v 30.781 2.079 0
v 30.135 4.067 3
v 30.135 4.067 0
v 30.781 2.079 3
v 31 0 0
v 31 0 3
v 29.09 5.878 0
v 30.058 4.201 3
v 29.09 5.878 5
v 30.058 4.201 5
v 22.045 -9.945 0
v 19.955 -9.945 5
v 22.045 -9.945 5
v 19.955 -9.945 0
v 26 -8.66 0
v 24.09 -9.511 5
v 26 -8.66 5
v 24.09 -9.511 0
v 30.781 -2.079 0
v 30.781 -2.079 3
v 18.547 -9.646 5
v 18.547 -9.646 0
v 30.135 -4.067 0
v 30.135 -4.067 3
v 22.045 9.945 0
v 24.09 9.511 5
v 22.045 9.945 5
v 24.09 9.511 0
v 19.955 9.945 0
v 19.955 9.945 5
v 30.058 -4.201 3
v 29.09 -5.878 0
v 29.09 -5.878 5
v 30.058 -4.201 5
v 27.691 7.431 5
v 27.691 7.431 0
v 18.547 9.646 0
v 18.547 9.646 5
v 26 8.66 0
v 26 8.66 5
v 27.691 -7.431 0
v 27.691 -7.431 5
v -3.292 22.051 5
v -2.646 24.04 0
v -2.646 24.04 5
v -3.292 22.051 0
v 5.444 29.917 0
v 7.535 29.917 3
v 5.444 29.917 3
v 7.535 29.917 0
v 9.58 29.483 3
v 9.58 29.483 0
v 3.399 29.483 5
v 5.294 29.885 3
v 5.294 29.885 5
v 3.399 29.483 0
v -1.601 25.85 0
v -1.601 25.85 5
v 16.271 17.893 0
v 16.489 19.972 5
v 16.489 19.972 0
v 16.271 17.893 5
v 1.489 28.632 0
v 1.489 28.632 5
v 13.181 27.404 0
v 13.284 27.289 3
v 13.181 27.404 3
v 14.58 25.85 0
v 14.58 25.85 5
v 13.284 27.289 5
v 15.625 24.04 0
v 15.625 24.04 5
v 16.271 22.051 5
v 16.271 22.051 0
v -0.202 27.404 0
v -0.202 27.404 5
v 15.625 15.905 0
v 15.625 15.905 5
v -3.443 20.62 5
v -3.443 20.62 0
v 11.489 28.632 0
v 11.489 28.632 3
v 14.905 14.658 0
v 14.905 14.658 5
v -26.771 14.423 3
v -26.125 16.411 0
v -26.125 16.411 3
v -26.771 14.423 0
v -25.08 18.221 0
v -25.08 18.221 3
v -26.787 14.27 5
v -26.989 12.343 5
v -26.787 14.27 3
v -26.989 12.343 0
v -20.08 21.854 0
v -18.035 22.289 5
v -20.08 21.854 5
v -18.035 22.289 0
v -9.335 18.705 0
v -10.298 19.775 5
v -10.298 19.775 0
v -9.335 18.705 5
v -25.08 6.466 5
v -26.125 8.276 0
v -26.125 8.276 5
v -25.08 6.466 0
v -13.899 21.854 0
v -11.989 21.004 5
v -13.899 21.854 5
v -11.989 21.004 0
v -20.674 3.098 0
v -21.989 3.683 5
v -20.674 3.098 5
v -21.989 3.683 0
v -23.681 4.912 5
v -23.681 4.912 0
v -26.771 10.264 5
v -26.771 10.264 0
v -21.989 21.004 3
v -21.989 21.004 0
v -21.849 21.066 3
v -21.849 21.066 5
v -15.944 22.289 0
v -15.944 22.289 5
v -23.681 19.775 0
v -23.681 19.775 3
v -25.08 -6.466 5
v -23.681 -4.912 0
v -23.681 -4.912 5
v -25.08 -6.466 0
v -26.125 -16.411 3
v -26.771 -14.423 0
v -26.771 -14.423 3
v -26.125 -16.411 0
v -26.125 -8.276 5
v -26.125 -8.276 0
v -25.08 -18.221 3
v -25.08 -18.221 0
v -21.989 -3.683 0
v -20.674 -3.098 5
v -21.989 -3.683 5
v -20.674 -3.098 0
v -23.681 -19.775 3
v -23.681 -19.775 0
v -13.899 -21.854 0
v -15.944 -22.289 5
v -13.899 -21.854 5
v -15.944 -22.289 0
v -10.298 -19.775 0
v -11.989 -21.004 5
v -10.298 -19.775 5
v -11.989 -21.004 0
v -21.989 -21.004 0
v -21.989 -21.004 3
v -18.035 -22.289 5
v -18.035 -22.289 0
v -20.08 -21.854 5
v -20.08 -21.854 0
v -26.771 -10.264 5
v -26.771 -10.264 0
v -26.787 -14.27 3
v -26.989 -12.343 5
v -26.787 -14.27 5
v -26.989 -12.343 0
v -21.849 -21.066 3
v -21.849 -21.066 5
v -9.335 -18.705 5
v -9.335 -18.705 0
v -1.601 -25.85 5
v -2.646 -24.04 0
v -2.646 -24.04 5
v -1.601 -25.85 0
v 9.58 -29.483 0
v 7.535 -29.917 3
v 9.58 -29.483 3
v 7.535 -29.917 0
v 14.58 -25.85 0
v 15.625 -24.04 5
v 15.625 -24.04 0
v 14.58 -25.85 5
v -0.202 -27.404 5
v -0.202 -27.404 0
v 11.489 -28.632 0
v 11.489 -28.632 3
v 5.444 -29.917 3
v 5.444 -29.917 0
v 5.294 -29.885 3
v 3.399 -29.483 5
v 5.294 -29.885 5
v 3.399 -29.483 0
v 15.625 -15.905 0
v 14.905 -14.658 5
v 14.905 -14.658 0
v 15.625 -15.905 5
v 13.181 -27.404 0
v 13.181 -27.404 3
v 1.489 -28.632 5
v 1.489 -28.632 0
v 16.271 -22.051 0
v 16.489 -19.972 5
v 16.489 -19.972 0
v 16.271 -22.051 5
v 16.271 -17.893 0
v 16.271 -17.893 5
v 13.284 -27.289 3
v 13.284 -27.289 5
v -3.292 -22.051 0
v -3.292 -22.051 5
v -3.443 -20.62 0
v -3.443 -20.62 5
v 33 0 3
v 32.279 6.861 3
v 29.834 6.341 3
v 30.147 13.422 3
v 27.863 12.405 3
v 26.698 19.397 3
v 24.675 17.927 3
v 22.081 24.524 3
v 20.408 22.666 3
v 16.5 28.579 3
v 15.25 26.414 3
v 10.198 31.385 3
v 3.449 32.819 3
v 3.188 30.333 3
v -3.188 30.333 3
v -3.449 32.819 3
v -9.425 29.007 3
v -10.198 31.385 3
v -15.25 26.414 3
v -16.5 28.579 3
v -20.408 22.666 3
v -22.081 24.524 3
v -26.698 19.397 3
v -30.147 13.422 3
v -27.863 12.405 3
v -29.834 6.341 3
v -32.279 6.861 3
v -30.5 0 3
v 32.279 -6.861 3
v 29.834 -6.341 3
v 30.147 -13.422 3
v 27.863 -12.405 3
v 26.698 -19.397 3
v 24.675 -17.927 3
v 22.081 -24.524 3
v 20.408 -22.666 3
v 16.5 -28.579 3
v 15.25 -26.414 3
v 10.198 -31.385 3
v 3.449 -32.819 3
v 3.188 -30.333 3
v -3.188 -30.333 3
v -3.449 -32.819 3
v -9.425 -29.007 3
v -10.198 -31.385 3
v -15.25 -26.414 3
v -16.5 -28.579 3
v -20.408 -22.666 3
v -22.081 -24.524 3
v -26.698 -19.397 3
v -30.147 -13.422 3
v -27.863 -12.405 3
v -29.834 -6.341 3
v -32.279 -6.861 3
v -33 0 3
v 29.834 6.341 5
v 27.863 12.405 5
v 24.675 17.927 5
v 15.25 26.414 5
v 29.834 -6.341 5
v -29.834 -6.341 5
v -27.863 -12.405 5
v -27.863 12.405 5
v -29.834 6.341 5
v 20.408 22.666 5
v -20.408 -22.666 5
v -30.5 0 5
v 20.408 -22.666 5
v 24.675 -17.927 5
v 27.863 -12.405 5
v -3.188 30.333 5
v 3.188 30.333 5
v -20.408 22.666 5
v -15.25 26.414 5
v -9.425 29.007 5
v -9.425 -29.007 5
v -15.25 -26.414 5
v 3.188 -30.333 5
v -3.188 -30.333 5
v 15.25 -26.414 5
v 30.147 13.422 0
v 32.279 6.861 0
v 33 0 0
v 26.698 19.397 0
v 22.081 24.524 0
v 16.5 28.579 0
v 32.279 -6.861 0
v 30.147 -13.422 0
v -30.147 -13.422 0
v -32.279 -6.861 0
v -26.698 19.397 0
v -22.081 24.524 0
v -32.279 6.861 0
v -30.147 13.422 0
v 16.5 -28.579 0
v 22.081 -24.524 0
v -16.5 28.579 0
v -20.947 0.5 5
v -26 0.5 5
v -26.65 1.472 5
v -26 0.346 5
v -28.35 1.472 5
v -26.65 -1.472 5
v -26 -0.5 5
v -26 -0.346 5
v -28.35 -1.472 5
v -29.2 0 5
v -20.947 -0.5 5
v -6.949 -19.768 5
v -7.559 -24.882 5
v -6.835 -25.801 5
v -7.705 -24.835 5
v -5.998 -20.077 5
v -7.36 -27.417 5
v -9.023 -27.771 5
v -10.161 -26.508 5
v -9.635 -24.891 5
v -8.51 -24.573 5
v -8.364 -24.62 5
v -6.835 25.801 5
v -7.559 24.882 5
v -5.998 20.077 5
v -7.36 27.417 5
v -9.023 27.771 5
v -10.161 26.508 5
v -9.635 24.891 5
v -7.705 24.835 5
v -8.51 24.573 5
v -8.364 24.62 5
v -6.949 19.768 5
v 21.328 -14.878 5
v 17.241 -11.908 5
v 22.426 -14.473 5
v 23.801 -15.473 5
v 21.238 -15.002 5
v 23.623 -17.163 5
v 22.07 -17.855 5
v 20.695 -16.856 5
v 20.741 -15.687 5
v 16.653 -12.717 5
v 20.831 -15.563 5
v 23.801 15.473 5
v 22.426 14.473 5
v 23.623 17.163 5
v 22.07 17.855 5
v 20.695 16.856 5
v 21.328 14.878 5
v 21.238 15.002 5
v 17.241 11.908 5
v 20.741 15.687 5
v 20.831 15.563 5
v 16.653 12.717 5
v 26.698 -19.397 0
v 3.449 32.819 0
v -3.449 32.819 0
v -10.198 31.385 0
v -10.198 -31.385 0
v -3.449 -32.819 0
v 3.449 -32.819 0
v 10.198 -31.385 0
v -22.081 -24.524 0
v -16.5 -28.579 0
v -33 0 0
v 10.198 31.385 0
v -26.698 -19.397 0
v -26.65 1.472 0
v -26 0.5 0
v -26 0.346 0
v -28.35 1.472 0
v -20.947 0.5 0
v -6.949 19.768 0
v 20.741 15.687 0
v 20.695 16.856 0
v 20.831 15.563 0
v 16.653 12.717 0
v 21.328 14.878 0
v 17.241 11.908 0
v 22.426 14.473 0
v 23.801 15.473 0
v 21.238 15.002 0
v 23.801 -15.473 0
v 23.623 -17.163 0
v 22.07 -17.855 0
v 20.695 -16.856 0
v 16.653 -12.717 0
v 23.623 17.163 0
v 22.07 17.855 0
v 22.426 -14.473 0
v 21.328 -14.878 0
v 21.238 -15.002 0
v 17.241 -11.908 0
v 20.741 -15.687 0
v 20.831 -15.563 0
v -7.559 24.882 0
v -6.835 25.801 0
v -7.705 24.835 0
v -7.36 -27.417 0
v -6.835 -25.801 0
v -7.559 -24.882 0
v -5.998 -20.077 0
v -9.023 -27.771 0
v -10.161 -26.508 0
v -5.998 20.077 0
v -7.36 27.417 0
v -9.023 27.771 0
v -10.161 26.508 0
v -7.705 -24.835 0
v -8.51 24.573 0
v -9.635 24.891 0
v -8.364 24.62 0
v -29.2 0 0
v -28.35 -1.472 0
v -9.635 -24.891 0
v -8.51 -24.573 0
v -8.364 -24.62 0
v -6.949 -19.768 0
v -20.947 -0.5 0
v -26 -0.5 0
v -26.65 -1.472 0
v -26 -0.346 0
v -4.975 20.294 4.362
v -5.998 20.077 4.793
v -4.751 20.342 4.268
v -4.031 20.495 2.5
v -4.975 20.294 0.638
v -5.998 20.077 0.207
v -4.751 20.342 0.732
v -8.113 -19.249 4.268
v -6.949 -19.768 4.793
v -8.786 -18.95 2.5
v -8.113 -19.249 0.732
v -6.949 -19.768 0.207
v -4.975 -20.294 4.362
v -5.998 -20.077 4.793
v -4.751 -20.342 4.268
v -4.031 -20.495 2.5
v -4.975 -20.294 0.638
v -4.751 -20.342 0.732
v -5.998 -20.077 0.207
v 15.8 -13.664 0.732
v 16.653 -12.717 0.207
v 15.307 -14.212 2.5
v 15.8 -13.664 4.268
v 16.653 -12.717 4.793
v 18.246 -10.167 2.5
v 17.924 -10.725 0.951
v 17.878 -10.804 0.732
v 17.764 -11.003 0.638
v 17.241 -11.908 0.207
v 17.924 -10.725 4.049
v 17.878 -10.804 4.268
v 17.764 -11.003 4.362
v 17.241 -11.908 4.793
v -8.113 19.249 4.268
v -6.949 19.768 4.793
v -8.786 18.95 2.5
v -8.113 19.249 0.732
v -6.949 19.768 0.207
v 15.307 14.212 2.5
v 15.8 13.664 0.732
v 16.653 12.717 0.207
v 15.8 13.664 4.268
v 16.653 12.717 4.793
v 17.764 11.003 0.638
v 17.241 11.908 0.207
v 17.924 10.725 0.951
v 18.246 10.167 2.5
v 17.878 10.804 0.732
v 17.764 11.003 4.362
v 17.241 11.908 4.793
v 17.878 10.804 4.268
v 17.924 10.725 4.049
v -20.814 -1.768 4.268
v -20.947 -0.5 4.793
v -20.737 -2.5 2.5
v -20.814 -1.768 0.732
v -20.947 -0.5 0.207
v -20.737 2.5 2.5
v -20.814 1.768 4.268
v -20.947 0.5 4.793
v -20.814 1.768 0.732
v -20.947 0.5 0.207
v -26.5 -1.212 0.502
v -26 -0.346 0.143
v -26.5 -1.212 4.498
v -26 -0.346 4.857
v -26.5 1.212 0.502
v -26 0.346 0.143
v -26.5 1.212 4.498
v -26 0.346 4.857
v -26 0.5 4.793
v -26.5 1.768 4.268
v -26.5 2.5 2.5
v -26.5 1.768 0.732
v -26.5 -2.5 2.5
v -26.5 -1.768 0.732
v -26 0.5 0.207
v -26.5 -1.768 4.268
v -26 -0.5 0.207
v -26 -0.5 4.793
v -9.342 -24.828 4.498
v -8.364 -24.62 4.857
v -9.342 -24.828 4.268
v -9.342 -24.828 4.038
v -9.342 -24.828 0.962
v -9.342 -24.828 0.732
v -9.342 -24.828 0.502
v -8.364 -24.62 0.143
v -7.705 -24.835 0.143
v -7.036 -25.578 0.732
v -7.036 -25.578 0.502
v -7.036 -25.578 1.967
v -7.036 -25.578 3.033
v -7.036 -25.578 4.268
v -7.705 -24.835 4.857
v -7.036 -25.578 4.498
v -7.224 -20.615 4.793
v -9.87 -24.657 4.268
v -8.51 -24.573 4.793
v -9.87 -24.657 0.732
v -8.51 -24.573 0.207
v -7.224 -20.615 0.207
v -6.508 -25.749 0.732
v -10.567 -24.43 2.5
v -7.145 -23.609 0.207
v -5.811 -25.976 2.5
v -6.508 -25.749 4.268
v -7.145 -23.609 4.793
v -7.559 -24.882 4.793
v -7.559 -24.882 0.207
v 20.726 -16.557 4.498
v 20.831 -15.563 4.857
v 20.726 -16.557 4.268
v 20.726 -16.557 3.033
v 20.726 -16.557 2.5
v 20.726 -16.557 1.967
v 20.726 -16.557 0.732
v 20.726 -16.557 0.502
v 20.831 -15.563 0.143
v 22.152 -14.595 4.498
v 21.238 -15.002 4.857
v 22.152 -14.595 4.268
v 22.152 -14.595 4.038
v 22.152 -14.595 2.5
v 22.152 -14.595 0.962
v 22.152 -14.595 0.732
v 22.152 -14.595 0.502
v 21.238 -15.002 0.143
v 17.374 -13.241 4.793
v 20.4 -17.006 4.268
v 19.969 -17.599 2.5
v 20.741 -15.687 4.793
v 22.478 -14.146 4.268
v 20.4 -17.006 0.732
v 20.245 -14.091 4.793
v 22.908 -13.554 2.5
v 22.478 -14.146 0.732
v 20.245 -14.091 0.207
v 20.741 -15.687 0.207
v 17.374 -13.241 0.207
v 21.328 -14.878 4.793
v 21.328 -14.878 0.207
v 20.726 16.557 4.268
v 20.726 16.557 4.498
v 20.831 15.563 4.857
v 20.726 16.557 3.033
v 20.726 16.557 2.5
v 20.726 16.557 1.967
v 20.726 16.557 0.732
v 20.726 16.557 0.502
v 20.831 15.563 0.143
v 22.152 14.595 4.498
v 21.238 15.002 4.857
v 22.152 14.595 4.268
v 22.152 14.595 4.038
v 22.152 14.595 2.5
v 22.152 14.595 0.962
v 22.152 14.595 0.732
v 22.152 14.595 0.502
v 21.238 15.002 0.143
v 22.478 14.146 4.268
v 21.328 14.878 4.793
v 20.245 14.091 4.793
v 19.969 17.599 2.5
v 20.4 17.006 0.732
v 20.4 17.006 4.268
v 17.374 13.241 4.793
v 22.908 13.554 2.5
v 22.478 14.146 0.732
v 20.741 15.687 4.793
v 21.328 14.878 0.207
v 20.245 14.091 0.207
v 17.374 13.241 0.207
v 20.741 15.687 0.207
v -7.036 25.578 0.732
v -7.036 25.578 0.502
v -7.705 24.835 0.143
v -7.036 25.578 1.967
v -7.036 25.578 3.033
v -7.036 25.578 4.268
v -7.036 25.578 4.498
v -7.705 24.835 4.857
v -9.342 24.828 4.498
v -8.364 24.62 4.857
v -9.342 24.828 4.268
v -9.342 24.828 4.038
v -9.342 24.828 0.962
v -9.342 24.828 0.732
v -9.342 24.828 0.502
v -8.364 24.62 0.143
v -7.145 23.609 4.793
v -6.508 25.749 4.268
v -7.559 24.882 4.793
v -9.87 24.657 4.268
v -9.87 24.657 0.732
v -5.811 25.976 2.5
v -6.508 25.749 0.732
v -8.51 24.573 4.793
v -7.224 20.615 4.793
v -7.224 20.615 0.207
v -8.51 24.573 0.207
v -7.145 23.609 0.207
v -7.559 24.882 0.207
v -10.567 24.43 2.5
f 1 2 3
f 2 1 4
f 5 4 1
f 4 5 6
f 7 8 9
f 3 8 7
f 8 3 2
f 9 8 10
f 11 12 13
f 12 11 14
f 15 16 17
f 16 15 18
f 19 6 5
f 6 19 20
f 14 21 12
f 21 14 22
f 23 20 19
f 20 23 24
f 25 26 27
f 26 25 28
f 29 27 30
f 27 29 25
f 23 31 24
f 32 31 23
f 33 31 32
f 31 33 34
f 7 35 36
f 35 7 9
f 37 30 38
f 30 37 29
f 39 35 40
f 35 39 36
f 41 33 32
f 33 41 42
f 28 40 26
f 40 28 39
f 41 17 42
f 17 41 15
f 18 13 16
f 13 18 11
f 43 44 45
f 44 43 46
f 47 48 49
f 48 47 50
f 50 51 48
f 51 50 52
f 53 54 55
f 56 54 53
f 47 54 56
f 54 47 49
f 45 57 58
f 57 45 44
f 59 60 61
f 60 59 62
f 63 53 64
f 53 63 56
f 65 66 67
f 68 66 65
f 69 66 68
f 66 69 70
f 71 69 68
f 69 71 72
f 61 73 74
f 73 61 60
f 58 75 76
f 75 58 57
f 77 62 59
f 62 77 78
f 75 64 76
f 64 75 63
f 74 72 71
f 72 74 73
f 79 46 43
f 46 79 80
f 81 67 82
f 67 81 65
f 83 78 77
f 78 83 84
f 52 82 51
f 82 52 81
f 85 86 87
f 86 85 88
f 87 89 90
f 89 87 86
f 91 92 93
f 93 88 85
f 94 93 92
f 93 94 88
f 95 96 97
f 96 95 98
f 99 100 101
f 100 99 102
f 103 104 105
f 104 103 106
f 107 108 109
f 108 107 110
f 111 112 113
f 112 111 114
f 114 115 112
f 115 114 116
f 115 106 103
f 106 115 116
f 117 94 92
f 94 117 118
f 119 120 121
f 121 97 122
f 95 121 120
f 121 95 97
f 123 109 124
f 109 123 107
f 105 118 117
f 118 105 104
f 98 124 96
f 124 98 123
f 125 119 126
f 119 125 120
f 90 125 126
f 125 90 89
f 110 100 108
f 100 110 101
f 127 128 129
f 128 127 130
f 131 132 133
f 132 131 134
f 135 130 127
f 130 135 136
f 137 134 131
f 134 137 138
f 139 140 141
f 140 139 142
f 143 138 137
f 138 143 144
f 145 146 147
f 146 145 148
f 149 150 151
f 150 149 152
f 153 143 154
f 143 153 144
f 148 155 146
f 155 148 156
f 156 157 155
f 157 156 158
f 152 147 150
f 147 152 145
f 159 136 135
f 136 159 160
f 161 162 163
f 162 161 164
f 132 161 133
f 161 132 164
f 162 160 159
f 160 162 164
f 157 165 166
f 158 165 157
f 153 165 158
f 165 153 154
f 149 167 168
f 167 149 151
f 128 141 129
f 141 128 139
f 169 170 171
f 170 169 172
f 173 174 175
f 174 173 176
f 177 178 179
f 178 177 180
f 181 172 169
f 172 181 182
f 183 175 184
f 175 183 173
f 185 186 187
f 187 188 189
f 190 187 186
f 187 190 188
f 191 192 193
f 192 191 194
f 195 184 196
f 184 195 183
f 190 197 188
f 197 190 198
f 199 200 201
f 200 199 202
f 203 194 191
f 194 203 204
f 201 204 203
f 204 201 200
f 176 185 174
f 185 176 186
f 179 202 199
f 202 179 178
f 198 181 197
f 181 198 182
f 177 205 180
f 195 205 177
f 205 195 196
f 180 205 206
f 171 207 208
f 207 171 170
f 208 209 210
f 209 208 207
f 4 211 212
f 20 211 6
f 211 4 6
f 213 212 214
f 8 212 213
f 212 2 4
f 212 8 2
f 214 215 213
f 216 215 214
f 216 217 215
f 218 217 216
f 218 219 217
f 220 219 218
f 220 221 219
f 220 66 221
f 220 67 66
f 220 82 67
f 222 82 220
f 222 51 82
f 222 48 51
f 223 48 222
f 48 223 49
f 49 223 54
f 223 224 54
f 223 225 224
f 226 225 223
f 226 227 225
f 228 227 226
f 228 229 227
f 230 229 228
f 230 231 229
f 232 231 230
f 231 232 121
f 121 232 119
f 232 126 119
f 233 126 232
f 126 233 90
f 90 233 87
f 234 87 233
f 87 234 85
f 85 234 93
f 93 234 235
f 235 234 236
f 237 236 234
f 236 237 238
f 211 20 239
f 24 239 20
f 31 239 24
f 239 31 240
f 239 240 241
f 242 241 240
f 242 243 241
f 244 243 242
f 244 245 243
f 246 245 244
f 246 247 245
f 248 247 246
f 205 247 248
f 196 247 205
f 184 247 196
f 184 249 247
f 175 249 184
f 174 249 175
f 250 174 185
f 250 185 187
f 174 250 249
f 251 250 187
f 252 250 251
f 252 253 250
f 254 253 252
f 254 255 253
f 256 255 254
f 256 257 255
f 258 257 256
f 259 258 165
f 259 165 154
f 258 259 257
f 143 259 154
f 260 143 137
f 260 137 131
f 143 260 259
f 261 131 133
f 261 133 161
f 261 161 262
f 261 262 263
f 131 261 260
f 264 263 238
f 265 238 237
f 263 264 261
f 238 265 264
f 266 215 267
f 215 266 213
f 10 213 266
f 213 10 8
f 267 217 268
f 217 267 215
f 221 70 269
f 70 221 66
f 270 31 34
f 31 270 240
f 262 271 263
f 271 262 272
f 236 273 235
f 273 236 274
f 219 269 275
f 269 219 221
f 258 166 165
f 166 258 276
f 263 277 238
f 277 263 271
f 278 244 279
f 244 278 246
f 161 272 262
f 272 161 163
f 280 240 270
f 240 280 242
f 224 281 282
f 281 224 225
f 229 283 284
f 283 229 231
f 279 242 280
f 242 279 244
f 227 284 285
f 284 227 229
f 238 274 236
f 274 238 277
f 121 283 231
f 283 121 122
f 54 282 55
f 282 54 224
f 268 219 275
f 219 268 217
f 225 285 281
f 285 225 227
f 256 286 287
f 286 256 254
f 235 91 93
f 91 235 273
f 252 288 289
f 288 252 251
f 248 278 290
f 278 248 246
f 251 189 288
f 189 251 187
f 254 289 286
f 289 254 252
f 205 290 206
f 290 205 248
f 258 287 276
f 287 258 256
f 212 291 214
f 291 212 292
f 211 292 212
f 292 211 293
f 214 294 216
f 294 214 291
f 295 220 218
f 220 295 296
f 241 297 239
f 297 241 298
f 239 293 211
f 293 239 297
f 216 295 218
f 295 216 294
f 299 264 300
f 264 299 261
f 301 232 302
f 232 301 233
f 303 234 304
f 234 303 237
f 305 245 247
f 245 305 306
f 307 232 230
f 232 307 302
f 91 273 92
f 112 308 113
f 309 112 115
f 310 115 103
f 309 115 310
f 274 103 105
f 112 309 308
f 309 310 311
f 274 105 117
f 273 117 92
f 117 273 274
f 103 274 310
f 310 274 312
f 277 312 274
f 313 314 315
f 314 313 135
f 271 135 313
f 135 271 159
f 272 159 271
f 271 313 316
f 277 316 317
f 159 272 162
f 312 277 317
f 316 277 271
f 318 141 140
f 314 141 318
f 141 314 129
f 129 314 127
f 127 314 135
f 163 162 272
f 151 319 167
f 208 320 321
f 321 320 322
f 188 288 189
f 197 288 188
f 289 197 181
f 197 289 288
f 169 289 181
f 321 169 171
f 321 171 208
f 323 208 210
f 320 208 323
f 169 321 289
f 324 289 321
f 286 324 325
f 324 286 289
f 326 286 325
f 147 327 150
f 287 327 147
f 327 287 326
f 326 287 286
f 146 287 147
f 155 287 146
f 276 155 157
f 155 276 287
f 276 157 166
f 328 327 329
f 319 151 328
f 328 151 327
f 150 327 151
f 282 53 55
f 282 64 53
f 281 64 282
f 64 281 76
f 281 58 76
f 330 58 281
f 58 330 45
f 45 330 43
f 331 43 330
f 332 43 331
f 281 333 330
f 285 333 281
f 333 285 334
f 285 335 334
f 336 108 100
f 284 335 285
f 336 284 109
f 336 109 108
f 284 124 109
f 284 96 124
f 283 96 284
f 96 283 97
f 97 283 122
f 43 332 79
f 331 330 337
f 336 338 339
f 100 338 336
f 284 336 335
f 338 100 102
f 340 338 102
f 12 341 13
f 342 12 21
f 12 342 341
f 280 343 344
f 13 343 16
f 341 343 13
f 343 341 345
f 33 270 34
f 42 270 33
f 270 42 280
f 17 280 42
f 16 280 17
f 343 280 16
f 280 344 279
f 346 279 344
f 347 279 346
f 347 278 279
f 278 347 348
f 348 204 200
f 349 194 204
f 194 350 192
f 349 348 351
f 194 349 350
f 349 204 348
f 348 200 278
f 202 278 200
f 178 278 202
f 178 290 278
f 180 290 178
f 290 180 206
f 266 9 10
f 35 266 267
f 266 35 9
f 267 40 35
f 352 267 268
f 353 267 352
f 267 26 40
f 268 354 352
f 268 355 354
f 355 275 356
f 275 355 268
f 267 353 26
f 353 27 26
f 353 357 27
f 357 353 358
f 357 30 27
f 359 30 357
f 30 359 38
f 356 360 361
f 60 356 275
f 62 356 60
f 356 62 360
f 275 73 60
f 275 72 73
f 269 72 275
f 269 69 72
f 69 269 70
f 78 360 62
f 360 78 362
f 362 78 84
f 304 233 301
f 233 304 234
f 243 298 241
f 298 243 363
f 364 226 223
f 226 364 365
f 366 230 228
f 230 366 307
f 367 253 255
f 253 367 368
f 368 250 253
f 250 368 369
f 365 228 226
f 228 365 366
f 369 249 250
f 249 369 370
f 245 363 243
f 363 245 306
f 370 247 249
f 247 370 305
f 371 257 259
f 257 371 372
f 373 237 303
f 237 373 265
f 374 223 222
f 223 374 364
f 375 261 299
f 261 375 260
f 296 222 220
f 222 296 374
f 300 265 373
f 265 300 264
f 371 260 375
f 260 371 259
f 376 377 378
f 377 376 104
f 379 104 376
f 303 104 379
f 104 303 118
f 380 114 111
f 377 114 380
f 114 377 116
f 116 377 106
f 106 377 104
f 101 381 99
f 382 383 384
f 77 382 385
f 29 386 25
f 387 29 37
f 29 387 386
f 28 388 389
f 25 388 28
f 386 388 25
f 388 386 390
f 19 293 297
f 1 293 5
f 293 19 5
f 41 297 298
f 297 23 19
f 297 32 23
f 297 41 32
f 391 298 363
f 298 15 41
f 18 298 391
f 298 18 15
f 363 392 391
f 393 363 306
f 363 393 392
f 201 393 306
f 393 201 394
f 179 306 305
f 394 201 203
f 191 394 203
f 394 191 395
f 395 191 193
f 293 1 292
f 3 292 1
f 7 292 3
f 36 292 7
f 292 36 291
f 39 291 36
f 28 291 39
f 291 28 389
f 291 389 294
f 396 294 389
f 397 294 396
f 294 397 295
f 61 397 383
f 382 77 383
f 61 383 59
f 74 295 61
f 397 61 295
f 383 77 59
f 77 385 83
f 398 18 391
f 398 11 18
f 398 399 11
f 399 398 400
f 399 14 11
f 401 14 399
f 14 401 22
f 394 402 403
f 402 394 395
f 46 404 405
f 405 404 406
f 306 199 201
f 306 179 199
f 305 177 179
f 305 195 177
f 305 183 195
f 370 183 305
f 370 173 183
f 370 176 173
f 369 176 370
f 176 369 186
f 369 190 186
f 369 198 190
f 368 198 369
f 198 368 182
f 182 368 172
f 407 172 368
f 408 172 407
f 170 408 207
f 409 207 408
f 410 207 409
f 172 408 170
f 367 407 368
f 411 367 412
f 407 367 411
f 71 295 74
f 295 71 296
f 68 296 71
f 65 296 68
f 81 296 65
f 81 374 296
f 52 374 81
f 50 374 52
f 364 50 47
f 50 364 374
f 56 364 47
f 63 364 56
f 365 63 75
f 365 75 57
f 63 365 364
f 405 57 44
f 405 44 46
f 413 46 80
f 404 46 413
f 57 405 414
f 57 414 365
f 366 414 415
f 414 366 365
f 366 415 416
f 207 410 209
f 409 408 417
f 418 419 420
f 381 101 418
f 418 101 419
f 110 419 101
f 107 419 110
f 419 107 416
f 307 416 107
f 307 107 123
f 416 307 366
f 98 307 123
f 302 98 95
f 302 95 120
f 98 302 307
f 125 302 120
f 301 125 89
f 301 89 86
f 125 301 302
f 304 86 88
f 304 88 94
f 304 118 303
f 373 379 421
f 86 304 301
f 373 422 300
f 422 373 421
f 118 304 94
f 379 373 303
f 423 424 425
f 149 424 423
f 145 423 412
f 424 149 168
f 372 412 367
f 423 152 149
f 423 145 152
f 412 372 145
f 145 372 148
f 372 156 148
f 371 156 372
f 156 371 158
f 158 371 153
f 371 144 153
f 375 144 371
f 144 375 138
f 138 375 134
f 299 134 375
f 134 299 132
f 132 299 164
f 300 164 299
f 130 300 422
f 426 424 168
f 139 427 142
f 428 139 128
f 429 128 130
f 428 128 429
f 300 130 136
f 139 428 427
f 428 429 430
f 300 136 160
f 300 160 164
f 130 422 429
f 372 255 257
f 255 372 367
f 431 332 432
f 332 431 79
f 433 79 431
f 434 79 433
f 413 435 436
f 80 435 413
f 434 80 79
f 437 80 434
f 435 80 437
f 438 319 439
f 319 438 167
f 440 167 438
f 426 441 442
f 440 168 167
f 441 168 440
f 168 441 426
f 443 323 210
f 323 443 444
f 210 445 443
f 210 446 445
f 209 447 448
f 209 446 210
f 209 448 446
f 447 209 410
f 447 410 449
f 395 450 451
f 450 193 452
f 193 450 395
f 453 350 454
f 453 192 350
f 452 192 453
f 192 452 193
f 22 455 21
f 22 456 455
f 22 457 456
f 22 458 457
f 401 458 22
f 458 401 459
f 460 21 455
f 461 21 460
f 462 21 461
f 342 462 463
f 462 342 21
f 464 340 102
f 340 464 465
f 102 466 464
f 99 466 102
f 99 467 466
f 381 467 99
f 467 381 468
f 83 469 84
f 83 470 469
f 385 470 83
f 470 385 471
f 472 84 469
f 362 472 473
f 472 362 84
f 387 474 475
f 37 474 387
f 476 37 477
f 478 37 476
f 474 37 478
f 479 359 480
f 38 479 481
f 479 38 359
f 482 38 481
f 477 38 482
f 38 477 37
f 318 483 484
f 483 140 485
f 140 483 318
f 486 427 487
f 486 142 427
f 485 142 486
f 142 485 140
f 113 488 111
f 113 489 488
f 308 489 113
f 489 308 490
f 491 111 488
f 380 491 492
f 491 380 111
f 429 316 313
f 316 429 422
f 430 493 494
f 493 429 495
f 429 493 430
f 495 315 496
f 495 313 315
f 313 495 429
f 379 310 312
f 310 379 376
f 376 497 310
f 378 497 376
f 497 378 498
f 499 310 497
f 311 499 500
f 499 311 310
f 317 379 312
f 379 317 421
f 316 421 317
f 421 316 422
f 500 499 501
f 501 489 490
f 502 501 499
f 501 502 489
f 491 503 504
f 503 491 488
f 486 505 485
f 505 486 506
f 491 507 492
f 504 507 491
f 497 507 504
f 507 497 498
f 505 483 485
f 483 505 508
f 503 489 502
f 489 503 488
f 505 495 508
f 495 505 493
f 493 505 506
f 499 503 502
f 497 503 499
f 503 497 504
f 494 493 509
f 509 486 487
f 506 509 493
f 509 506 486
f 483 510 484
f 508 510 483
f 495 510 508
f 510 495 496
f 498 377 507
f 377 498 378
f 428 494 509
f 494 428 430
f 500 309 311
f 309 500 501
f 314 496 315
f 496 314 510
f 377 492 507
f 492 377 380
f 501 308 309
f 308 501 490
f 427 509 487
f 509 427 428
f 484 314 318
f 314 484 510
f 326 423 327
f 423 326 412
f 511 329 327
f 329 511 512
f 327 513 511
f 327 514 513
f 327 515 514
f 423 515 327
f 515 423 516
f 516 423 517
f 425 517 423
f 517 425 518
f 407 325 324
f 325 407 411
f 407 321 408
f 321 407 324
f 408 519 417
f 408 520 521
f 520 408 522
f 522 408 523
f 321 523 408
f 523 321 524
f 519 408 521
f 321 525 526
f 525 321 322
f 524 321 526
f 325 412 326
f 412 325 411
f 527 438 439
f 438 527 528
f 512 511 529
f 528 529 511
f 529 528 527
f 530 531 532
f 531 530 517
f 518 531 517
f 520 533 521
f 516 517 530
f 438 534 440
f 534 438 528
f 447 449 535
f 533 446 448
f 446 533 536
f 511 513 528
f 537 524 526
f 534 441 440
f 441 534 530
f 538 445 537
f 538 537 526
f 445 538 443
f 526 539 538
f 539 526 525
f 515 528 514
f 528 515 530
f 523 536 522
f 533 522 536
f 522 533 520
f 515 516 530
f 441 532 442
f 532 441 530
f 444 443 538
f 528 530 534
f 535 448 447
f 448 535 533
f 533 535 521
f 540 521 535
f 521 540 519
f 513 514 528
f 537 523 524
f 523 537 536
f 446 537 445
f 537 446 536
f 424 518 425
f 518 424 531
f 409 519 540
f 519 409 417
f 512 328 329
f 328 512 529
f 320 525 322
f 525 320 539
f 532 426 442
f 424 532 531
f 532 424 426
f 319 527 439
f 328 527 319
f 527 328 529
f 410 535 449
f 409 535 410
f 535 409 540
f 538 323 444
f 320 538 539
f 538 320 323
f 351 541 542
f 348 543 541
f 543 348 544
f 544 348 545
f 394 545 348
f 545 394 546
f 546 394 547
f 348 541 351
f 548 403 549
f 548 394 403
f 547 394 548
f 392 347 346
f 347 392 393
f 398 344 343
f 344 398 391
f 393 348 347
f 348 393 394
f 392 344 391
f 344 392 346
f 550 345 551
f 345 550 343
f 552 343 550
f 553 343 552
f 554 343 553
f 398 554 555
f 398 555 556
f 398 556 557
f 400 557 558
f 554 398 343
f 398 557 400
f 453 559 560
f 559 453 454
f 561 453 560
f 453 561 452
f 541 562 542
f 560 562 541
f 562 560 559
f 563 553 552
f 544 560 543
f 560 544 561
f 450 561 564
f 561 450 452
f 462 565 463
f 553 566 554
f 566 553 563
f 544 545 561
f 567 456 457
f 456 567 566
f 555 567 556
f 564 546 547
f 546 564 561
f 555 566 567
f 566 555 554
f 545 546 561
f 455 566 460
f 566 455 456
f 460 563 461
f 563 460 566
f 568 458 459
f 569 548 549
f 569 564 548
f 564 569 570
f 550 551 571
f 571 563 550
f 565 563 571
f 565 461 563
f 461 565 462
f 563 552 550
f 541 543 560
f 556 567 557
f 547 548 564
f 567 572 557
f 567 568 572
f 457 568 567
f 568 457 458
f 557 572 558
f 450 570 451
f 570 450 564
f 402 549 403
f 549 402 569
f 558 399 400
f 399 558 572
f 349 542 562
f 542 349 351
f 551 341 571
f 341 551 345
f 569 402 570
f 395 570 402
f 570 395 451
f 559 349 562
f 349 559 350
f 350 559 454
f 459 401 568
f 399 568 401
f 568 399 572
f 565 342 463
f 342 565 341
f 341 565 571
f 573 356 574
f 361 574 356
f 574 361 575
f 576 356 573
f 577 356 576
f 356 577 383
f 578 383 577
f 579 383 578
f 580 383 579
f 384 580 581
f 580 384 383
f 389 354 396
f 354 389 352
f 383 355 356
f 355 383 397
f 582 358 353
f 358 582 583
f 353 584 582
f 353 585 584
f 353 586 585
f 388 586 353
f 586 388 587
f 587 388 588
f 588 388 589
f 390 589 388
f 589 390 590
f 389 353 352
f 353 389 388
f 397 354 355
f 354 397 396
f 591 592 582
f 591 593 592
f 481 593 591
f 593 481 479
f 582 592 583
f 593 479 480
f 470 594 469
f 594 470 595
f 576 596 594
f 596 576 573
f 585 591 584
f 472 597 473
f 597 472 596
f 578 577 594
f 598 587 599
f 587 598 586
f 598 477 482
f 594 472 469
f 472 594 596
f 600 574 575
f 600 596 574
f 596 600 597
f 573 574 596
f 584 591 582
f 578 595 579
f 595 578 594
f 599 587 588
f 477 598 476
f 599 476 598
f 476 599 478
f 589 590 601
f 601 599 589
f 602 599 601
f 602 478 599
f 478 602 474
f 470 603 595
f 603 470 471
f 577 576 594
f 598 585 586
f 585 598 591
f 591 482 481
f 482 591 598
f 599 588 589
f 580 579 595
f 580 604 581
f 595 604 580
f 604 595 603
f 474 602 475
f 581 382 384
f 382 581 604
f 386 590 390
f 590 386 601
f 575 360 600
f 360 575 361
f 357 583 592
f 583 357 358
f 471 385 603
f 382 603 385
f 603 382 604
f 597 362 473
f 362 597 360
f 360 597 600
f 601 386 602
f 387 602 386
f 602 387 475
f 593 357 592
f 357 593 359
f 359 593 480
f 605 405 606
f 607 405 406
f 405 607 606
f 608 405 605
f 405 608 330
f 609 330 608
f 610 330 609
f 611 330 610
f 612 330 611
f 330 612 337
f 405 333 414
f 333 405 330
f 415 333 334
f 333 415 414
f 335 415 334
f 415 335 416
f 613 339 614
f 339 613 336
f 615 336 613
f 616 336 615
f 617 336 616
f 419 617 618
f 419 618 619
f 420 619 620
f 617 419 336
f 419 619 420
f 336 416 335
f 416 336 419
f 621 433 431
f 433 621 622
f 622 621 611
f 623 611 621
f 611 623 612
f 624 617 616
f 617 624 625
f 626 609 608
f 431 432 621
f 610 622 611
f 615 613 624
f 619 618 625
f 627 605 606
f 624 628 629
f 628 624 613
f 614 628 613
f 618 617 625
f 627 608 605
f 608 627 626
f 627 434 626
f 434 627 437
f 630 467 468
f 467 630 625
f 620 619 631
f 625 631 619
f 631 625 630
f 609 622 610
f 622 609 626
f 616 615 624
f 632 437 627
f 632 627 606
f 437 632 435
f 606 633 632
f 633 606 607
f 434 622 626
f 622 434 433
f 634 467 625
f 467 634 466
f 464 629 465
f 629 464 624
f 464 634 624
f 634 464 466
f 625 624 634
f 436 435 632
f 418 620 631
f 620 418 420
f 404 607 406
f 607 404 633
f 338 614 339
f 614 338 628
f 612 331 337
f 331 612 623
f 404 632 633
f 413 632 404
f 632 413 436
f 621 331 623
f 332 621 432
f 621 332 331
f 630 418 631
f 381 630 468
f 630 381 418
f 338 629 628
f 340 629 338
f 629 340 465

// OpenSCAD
//$fa = 6;
//$fs = 0.4;

// NB: Print this in something translucent
light_ring();

module light_ring(){
    difference() {
        union () {
            // gearbox lugs
            difference() {
                cylinder(d=66, h=5);
                for (i=[0:4]) {
                    rotate([0,0,i*72]) translate([21,0,-1]) cylinder(h=7, d=20);
                }
                translate([0,0,-1]) cylinder(d=42, h=7);
                difference() {
                    translate([0,0,3]) difference(){
                        cylinder(d=68, h=4);
                        translate([0,0,-1]) cylinder(d=61, h=6);
                    }
                }
            }
        }
        
        for (i=[0:4]) {
            // outer mounting holes (far enough from edge and from upper nuts to not collide
            rotate([0,0,i*72]) translate([-27.5,0,0]) cylinder(h=6, d=3.4);
            // LED Mounting holes
            rotate([0,0,i*72]) translate([-20,0,2.5]) rotate([0,-90,0]) cylinder(h=6.5, d=5);
            // slots to stop LED mounting getting silly
            rotate([0,0,i*72]) translate([-20,0,2.5]) cube([12,1,7], center=true);
        }
    }
}
